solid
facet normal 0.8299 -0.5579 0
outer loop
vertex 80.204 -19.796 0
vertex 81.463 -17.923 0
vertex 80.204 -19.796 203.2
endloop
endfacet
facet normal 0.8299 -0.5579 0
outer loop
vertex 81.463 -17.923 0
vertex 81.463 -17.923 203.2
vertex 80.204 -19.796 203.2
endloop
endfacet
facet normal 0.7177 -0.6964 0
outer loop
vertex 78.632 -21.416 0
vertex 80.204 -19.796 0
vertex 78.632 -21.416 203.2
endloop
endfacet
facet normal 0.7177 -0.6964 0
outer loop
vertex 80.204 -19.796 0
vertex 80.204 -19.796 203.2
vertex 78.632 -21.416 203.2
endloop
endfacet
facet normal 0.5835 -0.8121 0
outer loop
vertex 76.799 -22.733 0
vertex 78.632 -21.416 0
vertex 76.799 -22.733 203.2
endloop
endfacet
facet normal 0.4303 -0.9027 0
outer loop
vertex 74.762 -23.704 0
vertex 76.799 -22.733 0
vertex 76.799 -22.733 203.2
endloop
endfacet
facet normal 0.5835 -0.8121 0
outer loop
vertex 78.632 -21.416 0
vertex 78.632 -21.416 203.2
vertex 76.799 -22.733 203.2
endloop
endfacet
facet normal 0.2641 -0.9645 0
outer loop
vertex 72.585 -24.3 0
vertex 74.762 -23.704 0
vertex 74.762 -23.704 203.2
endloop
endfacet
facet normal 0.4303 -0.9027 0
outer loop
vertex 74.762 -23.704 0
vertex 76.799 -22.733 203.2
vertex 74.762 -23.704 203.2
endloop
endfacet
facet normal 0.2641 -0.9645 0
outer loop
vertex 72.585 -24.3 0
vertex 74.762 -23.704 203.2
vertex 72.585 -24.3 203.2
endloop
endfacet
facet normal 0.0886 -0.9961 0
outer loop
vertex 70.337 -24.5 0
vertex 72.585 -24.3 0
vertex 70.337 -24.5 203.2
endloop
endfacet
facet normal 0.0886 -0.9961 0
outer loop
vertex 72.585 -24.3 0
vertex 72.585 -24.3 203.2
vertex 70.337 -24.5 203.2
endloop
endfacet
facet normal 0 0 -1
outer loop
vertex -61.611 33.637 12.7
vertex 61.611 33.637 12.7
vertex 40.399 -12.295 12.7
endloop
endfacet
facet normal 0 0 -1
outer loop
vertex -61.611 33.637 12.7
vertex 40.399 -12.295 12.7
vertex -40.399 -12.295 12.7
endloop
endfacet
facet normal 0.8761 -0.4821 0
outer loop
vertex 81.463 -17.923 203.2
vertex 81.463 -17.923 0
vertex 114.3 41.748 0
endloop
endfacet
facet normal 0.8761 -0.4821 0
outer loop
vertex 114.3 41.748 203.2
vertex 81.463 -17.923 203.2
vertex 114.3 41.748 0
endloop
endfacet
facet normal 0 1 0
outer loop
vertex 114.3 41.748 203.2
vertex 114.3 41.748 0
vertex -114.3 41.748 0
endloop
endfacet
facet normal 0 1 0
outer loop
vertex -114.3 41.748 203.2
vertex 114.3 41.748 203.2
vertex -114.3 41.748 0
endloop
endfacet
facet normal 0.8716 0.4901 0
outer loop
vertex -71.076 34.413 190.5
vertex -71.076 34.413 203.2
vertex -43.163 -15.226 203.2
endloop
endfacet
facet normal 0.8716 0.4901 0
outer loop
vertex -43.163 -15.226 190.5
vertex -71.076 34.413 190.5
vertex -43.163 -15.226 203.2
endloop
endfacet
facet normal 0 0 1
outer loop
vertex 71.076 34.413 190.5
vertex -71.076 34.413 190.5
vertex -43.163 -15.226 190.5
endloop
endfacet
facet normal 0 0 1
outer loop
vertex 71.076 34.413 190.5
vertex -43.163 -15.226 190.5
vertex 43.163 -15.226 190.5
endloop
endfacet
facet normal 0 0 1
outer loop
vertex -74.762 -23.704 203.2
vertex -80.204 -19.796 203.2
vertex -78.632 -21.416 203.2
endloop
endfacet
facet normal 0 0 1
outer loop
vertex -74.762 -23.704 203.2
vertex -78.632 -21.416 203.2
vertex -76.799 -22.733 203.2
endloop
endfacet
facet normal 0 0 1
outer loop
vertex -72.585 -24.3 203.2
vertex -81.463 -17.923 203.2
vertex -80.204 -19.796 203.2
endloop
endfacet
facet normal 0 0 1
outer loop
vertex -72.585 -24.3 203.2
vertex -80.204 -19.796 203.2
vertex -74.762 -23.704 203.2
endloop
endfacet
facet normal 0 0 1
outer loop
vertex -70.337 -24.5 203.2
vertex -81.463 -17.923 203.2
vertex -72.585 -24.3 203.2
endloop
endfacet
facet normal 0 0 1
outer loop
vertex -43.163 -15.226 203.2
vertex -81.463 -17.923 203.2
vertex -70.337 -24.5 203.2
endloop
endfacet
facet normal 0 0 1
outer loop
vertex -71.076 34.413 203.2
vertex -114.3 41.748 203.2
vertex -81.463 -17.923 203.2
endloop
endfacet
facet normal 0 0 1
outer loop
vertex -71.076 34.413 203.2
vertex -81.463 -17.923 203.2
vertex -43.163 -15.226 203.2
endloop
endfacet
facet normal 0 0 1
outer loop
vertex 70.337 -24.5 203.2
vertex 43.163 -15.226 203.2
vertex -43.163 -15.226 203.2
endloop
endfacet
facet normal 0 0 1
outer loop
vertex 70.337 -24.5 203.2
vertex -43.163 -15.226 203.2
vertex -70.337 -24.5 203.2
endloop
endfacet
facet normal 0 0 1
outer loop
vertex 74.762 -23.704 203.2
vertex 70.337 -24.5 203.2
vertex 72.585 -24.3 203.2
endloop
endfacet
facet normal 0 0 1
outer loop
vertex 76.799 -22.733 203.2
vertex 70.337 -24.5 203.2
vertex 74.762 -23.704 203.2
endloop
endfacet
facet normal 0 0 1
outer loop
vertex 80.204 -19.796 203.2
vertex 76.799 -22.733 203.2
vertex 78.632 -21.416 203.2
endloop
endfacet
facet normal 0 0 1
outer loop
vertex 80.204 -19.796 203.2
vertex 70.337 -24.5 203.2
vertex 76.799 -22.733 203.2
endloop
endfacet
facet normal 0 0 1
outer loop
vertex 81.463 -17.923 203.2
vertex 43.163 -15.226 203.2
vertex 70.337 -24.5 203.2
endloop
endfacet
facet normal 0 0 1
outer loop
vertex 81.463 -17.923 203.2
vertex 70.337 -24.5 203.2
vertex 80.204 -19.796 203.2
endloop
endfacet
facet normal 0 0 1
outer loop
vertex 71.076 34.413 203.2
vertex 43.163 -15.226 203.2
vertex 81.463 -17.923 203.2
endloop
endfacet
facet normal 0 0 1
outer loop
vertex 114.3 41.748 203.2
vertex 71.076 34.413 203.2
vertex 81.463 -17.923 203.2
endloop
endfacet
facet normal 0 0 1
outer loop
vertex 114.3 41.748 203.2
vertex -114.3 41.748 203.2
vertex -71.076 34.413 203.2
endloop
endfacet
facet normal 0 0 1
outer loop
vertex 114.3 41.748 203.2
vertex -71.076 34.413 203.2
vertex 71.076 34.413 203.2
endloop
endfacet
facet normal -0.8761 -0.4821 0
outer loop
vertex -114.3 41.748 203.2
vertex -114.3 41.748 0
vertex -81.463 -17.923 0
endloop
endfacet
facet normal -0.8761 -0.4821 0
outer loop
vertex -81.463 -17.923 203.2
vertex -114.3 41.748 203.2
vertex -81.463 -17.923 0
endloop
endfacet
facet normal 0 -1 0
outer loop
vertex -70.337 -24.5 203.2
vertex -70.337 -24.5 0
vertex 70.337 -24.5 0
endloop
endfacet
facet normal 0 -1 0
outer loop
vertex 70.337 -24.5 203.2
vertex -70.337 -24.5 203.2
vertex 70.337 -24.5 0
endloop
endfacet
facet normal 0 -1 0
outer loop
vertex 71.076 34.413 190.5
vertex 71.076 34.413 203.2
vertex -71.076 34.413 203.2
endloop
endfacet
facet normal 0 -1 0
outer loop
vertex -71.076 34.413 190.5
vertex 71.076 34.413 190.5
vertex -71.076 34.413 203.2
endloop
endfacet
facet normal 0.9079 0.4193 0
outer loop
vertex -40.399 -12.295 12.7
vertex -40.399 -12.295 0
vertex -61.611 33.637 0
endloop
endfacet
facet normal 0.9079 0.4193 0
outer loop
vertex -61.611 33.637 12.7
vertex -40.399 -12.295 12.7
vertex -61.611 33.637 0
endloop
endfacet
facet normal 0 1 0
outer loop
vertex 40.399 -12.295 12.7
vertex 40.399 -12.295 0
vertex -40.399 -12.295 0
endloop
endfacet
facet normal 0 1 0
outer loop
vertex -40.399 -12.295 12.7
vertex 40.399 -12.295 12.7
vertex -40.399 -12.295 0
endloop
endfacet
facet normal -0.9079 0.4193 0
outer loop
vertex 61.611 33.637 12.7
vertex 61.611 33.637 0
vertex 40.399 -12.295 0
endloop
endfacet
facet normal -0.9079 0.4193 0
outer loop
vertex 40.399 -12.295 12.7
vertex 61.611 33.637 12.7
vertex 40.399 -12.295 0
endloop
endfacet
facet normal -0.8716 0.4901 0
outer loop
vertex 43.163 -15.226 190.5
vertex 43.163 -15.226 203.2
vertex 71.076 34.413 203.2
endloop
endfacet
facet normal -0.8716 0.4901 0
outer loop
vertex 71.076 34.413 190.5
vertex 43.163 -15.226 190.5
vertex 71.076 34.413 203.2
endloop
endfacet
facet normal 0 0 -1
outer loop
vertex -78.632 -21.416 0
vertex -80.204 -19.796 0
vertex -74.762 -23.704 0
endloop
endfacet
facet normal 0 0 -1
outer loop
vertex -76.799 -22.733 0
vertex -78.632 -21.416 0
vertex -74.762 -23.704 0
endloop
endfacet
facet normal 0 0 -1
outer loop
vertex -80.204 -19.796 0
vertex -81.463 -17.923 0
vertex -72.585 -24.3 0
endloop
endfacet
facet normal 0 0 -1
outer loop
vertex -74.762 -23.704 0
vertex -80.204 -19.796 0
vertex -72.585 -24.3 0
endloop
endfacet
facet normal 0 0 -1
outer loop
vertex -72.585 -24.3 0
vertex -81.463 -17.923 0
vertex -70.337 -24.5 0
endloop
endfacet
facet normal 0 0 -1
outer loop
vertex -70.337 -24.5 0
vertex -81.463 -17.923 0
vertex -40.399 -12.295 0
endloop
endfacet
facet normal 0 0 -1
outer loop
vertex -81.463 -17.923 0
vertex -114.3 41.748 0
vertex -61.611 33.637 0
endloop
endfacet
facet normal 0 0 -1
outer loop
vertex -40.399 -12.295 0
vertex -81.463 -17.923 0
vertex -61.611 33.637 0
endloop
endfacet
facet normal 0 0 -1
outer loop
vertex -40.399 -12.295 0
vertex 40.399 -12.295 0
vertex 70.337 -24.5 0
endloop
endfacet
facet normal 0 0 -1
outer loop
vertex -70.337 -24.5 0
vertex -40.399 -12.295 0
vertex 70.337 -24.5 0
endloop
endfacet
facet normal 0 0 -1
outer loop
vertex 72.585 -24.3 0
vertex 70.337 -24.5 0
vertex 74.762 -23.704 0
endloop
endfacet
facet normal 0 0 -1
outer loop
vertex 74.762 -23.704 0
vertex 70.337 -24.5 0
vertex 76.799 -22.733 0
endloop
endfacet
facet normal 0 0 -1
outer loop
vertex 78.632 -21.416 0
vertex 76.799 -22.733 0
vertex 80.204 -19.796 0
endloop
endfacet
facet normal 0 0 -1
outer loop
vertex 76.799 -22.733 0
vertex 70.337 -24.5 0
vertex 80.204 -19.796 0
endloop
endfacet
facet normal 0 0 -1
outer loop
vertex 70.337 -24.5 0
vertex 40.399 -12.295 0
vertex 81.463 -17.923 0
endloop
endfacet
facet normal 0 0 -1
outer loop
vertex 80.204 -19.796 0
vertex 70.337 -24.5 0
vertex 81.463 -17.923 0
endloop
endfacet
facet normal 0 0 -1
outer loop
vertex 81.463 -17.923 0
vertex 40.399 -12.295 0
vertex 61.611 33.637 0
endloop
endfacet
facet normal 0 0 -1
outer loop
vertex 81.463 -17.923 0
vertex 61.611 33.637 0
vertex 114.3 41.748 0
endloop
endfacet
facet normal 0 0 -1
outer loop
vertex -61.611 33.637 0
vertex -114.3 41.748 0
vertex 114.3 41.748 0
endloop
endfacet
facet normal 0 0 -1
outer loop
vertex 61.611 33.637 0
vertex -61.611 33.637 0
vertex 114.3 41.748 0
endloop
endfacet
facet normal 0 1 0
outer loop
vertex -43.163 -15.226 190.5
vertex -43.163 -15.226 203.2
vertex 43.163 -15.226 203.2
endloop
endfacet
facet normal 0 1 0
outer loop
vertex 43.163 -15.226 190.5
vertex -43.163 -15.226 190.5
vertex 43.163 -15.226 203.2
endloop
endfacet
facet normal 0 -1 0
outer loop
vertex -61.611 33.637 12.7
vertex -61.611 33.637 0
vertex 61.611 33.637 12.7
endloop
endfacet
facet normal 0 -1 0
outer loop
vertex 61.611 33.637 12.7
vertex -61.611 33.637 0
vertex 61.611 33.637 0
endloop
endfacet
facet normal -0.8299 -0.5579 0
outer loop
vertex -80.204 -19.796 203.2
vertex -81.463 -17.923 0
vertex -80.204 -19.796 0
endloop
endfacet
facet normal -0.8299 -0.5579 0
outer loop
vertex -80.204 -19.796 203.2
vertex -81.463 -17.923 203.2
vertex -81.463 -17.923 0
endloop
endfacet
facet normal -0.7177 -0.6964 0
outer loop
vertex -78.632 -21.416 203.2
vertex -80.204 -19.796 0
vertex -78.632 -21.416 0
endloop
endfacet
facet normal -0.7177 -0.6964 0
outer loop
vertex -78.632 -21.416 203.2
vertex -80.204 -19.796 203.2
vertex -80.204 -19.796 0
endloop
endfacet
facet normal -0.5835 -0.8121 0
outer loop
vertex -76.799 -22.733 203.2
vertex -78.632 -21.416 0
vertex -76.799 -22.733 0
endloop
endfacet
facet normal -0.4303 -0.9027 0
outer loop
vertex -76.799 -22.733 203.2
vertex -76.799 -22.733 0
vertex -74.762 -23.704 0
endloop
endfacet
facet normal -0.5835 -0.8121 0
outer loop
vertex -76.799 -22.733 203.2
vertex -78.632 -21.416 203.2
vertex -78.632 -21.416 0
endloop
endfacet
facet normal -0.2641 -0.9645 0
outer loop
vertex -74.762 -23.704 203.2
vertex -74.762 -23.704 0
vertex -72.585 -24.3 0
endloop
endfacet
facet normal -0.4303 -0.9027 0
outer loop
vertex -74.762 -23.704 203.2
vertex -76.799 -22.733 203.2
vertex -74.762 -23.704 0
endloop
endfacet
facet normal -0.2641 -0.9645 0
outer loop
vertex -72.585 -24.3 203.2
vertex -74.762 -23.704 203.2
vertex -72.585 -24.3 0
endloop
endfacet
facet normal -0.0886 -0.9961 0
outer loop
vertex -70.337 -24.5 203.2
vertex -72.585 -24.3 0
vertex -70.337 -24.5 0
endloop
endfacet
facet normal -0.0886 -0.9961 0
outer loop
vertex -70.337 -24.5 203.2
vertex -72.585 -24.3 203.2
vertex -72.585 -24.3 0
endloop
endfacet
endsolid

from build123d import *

# Parameters (mm, degrees)
BOSS_EXTRUDE1_DEPTH = 203.2
CUT_EXTRUDE1_DEPTH  = 12.7
CUT_EXTRUDE2_DEPTH  = 12.7
FILLET3_R           = 12.7


with BuildPart() as part:
    # Sketch1 → Boss-Extrude1 (new body)
    with BuildSketch(Plane.XY):
        Polygon((-114.3, 41.748133631), (-77.843883309, -24.500078422), (77.843883309, -24.500078422), (114.3, 41.748133631), align=None)
    extrude(amount=BOSS_EXTRUDE1_DEPTH)

    # Sketch2 → Cut-Extrude1 (cut)
    with BuildSketch(Plane(origin=(0, 0, 0), x_dir=(-1, 0, 0), z_dir=(0, 0, -1))):
        Polygon((61.610965664, 33.637347898), (-61.610965664, 33.637347898), (-40.398919629, -12.294528868), (40.398919629, -12.294528868), align=None)
    extrude(amount=-CUT_EXTRUDE1_DEPTH, mode=Mode.SUBTRACT)

    # Sketch3 → Cut-Extrude2 (cut)
    with BuildSketch(Plane.XY.offset(203.2)):
        Polygon((71.075916858, 34.413325386), (-71.075916858, 34.413325386), (-43.162708171, -15.225650552), (43.162708171, -15.225650552), align=None)
    extrude(amount=-CUT_EXTRUDE2_DEPTH, mode=Mode.SUBTRACT)

    # Fillet3
    fillet3_edges = [part.edges().sort_by_distance(p)[0] for p in [
        (-77.843883309, -24.500078422, 101.6),
        (77.843883309, -24.500078422, 101.6),
    ]]
    fillet(fillet3_edges, radius=FILLET3_R)


solid = part.part
